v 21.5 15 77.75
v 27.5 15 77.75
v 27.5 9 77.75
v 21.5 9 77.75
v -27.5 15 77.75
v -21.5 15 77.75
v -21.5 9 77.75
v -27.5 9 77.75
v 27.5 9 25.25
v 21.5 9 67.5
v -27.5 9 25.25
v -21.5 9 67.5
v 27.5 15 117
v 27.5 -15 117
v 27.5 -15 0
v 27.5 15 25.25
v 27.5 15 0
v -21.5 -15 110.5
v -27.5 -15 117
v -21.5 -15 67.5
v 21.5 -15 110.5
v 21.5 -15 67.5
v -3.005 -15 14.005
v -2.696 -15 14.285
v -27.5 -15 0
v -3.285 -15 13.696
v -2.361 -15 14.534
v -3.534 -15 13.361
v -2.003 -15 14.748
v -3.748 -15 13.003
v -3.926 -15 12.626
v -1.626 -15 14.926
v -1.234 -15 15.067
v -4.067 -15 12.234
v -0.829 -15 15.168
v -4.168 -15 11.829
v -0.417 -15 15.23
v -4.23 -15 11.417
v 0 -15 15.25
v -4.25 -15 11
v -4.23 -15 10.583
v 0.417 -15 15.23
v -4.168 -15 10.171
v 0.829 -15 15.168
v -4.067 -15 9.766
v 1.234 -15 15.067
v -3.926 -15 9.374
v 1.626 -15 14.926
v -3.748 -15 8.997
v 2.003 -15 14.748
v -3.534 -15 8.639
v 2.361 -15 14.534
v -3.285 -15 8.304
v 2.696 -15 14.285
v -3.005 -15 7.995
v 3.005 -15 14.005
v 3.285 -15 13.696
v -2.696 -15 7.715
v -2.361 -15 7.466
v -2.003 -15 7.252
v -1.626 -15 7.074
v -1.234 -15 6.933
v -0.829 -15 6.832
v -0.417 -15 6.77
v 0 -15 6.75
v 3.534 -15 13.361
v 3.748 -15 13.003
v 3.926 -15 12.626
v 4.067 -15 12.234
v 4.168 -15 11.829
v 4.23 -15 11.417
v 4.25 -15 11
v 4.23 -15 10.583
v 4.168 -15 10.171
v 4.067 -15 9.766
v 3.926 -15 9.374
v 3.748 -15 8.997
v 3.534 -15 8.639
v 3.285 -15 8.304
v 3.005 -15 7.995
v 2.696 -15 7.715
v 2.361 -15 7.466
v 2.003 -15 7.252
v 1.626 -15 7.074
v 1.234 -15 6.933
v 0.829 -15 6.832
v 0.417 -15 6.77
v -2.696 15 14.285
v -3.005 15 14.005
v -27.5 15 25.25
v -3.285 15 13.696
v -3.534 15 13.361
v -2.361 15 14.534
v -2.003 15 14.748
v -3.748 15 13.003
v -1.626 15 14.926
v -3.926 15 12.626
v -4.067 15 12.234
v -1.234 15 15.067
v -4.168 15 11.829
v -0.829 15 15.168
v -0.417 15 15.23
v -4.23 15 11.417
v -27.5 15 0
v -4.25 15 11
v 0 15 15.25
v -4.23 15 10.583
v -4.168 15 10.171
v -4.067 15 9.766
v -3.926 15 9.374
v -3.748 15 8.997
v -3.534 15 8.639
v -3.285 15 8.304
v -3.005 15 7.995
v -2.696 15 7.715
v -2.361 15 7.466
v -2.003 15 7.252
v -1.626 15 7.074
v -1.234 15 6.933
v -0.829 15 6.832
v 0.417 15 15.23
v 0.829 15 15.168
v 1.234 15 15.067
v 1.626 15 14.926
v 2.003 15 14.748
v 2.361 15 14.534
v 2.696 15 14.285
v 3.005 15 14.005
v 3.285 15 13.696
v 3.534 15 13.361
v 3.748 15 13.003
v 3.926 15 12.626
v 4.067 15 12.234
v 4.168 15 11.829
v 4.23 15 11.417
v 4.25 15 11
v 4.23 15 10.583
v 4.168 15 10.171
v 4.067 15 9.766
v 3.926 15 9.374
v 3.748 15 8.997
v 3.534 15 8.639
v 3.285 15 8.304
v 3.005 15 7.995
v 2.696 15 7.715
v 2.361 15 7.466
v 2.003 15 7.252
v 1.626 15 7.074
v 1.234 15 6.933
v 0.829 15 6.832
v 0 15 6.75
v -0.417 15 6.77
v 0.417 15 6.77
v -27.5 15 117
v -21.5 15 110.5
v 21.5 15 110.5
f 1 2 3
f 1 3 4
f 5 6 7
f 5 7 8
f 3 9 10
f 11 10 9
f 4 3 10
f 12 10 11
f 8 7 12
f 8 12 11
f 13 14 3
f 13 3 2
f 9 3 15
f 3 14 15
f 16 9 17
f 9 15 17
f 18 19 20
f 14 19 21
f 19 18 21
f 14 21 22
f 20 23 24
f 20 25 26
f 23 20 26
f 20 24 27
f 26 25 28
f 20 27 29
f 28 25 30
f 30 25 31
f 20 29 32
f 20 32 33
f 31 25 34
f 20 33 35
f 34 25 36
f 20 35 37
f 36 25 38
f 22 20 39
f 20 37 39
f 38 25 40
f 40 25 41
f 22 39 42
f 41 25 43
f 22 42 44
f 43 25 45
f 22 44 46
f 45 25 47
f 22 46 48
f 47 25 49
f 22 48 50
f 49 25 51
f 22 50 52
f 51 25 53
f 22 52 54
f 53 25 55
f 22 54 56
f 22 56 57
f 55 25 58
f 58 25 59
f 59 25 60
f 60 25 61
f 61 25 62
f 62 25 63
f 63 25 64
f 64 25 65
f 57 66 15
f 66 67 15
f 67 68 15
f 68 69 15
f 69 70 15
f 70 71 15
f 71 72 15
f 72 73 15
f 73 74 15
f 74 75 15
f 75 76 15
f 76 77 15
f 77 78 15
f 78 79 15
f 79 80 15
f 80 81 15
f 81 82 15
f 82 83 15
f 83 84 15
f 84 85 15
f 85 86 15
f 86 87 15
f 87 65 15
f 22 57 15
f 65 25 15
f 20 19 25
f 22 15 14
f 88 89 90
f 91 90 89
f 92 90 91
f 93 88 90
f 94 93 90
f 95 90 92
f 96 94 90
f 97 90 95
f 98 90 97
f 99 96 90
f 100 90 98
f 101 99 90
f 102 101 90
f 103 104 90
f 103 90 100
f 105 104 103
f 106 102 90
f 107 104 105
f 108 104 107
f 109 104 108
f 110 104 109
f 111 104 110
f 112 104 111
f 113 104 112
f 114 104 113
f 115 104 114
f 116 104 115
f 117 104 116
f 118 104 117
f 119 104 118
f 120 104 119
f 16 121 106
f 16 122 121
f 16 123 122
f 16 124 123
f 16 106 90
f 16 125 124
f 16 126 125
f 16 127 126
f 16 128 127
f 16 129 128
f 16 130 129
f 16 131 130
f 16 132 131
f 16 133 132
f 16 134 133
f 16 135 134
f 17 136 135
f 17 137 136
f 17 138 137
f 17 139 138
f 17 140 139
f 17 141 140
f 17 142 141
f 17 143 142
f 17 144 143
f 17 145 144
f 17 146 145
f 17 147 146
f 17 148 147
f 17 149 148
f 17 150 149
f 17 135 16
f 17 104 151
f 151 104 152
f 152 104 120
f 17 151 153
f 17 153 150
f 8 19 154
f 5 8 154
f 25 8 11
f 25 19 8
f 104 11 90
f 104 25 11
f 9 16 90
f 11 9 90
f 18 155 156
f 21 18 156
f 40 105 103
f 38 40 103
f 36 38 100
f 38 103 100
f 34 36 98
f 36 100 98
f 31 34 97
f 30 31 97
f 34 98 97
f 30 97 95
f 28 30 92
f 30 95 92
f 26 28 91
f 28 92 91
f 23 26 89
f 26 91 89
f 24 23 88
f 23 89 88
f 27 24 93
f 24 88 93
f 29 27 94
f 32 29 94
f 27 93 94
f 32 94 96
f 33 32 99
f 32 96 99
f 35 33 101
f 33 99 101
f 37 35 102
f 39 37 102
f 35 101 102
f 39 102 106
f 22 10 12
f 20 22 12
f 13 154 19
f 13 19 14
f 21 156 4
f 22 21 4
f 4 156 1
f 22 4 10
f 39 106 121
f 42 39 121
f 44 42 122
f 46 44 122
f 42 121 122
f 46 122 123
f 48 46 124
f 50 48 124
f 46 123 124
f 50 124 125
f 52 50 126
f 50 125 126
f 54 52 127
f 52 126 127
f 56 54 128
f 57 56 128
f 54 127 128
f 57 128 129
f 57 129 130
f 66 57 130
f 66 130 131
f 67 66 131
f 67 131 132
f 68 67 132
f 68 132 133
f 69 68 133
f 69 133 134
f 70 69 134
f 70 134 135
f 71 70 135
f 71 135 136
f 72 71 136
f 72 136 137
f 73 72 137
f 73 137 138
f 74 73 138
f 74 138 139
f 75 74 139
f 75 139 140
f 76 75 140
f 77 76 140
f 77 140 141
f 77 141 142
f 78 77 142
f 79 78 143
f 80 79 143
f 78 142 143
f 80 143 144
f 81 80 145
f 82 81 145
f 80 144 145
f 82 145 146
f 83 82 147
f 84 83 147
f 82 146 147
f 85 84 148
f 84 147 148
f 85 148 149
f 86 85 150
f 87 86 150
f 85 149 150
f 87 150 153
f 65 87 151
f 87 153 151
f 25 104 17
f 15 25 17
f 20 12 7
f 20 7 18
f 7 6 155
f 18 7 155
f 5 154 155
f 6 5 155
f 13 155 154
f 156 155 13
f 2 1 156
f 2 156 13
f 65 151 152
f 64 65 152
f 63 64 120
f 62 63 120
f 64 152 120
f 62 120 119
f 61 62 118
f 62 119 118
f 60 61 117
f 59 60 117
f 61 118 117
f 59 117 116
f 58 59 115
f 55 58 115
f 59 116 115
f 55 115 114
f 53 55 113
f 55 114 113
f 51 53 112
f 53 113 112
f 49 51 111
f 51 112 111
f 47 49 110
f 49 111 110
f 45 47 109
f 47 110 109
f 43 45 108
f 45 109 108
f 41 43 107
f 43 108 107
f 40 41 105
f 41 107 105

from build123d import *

# Parameters (mm, degrees)
F0_W     = 55
F0_H     = 30
F1_DEPTH = 117
F3_DEPTH = 47.244
F4_W     = 55
F4_H     = 52.50004
F5_DEPTH = 6


with BuildPart() as f1:
    # F0 (on Top) → F1 (new body)
    with BuildSketch(Plane.XY):
        Rectangle(F0_W, F0_H)
    extrude(amount=F1_DEPTH)

    # F2 (on face) → F3 (cut)
    with BuildSketch(Plane(origin=(0, 15, 0), x_dir=(-1, 0, 0), z_dir=(0, 1, 0))):
        with BuildLine():
            ThreePointArc((0, 15.25), (-4.25, 11), (0, 6.75))
            Line((0, 6.75), (0, 11))
            Line((0, 11), (0, 15.25))
        make_face()
        with BuildLine():
            Line((-21.5, 67.5), (0, 67.5))
            Line((0, 67.5), (0, 75))
            ThreePointArc((0, 75), (-14, 89), (0, 103))
            Line((0, 103), (0, 110.5))
            Line((0, 110.5), (-21.5, 110.5))
            Line((-21.5, 110.5), (-21.5, 67.5))
        make_face()
        with BuildLine():
            Line((0, 75), (0, 67.5))
            Line((0, 67.5), (21.5, 67.5))
            Line((21.5, 67.5), (21.5, 110.5))
            Line((21.5, 110.5), (0, 110.5))
            Line((0, 110.5), (0, 103))
            ThreePointArc((0, 103), (9.899495, 98.899495), (14, 89))
            ThreePointArc((14, 89), (9.899495, 79.100505), (0, 75))
        make_face()
        with BuildLine():
            Line((0, 11), (0, 6.75))
            ThreePointArc((0, 6.75), (3.005204, 7.994796), (4.25, 11))
            ThreePointArc((4.25, 11), (3.005204, 14.005204), (0, 15.25))
            Line((0, 15.25), (0, 11))
        make_face()
        with BuildLine():
            ThreePointArc((0, 103), (-14, 89), (0, 75))
            Line((0, 75), (0, 89))
            Line((0, 89), (0, 103))
        make_face()
        with BuildLine():
            Line((0, 89), (0, 75))
            ThreePointArc((0, 75), (9.899495, 79.100505), (14, 89))
            ThreePointArc((14, 89), (9.899495, 98.899495), (0, 103))
            Line((0, 103), (0, 89))
        make_face()
    extrude(amount=-F3_DEPTH, mode=Mode.SUBTRACT)

    # F4 (on face) → F5 (cut)
    with BuildSketch(Plane(origin=(0, 15, 0), x_dir=(-1, 0, 0), z_dir=(0, 1, 0))):
        with Locations((0, 51.5)):
            Rectangle(F4_W, F4_H)
    extrude(amount=-F5_DEPTH, mode=Mode.SUBTRACT)


solid = f1.part
